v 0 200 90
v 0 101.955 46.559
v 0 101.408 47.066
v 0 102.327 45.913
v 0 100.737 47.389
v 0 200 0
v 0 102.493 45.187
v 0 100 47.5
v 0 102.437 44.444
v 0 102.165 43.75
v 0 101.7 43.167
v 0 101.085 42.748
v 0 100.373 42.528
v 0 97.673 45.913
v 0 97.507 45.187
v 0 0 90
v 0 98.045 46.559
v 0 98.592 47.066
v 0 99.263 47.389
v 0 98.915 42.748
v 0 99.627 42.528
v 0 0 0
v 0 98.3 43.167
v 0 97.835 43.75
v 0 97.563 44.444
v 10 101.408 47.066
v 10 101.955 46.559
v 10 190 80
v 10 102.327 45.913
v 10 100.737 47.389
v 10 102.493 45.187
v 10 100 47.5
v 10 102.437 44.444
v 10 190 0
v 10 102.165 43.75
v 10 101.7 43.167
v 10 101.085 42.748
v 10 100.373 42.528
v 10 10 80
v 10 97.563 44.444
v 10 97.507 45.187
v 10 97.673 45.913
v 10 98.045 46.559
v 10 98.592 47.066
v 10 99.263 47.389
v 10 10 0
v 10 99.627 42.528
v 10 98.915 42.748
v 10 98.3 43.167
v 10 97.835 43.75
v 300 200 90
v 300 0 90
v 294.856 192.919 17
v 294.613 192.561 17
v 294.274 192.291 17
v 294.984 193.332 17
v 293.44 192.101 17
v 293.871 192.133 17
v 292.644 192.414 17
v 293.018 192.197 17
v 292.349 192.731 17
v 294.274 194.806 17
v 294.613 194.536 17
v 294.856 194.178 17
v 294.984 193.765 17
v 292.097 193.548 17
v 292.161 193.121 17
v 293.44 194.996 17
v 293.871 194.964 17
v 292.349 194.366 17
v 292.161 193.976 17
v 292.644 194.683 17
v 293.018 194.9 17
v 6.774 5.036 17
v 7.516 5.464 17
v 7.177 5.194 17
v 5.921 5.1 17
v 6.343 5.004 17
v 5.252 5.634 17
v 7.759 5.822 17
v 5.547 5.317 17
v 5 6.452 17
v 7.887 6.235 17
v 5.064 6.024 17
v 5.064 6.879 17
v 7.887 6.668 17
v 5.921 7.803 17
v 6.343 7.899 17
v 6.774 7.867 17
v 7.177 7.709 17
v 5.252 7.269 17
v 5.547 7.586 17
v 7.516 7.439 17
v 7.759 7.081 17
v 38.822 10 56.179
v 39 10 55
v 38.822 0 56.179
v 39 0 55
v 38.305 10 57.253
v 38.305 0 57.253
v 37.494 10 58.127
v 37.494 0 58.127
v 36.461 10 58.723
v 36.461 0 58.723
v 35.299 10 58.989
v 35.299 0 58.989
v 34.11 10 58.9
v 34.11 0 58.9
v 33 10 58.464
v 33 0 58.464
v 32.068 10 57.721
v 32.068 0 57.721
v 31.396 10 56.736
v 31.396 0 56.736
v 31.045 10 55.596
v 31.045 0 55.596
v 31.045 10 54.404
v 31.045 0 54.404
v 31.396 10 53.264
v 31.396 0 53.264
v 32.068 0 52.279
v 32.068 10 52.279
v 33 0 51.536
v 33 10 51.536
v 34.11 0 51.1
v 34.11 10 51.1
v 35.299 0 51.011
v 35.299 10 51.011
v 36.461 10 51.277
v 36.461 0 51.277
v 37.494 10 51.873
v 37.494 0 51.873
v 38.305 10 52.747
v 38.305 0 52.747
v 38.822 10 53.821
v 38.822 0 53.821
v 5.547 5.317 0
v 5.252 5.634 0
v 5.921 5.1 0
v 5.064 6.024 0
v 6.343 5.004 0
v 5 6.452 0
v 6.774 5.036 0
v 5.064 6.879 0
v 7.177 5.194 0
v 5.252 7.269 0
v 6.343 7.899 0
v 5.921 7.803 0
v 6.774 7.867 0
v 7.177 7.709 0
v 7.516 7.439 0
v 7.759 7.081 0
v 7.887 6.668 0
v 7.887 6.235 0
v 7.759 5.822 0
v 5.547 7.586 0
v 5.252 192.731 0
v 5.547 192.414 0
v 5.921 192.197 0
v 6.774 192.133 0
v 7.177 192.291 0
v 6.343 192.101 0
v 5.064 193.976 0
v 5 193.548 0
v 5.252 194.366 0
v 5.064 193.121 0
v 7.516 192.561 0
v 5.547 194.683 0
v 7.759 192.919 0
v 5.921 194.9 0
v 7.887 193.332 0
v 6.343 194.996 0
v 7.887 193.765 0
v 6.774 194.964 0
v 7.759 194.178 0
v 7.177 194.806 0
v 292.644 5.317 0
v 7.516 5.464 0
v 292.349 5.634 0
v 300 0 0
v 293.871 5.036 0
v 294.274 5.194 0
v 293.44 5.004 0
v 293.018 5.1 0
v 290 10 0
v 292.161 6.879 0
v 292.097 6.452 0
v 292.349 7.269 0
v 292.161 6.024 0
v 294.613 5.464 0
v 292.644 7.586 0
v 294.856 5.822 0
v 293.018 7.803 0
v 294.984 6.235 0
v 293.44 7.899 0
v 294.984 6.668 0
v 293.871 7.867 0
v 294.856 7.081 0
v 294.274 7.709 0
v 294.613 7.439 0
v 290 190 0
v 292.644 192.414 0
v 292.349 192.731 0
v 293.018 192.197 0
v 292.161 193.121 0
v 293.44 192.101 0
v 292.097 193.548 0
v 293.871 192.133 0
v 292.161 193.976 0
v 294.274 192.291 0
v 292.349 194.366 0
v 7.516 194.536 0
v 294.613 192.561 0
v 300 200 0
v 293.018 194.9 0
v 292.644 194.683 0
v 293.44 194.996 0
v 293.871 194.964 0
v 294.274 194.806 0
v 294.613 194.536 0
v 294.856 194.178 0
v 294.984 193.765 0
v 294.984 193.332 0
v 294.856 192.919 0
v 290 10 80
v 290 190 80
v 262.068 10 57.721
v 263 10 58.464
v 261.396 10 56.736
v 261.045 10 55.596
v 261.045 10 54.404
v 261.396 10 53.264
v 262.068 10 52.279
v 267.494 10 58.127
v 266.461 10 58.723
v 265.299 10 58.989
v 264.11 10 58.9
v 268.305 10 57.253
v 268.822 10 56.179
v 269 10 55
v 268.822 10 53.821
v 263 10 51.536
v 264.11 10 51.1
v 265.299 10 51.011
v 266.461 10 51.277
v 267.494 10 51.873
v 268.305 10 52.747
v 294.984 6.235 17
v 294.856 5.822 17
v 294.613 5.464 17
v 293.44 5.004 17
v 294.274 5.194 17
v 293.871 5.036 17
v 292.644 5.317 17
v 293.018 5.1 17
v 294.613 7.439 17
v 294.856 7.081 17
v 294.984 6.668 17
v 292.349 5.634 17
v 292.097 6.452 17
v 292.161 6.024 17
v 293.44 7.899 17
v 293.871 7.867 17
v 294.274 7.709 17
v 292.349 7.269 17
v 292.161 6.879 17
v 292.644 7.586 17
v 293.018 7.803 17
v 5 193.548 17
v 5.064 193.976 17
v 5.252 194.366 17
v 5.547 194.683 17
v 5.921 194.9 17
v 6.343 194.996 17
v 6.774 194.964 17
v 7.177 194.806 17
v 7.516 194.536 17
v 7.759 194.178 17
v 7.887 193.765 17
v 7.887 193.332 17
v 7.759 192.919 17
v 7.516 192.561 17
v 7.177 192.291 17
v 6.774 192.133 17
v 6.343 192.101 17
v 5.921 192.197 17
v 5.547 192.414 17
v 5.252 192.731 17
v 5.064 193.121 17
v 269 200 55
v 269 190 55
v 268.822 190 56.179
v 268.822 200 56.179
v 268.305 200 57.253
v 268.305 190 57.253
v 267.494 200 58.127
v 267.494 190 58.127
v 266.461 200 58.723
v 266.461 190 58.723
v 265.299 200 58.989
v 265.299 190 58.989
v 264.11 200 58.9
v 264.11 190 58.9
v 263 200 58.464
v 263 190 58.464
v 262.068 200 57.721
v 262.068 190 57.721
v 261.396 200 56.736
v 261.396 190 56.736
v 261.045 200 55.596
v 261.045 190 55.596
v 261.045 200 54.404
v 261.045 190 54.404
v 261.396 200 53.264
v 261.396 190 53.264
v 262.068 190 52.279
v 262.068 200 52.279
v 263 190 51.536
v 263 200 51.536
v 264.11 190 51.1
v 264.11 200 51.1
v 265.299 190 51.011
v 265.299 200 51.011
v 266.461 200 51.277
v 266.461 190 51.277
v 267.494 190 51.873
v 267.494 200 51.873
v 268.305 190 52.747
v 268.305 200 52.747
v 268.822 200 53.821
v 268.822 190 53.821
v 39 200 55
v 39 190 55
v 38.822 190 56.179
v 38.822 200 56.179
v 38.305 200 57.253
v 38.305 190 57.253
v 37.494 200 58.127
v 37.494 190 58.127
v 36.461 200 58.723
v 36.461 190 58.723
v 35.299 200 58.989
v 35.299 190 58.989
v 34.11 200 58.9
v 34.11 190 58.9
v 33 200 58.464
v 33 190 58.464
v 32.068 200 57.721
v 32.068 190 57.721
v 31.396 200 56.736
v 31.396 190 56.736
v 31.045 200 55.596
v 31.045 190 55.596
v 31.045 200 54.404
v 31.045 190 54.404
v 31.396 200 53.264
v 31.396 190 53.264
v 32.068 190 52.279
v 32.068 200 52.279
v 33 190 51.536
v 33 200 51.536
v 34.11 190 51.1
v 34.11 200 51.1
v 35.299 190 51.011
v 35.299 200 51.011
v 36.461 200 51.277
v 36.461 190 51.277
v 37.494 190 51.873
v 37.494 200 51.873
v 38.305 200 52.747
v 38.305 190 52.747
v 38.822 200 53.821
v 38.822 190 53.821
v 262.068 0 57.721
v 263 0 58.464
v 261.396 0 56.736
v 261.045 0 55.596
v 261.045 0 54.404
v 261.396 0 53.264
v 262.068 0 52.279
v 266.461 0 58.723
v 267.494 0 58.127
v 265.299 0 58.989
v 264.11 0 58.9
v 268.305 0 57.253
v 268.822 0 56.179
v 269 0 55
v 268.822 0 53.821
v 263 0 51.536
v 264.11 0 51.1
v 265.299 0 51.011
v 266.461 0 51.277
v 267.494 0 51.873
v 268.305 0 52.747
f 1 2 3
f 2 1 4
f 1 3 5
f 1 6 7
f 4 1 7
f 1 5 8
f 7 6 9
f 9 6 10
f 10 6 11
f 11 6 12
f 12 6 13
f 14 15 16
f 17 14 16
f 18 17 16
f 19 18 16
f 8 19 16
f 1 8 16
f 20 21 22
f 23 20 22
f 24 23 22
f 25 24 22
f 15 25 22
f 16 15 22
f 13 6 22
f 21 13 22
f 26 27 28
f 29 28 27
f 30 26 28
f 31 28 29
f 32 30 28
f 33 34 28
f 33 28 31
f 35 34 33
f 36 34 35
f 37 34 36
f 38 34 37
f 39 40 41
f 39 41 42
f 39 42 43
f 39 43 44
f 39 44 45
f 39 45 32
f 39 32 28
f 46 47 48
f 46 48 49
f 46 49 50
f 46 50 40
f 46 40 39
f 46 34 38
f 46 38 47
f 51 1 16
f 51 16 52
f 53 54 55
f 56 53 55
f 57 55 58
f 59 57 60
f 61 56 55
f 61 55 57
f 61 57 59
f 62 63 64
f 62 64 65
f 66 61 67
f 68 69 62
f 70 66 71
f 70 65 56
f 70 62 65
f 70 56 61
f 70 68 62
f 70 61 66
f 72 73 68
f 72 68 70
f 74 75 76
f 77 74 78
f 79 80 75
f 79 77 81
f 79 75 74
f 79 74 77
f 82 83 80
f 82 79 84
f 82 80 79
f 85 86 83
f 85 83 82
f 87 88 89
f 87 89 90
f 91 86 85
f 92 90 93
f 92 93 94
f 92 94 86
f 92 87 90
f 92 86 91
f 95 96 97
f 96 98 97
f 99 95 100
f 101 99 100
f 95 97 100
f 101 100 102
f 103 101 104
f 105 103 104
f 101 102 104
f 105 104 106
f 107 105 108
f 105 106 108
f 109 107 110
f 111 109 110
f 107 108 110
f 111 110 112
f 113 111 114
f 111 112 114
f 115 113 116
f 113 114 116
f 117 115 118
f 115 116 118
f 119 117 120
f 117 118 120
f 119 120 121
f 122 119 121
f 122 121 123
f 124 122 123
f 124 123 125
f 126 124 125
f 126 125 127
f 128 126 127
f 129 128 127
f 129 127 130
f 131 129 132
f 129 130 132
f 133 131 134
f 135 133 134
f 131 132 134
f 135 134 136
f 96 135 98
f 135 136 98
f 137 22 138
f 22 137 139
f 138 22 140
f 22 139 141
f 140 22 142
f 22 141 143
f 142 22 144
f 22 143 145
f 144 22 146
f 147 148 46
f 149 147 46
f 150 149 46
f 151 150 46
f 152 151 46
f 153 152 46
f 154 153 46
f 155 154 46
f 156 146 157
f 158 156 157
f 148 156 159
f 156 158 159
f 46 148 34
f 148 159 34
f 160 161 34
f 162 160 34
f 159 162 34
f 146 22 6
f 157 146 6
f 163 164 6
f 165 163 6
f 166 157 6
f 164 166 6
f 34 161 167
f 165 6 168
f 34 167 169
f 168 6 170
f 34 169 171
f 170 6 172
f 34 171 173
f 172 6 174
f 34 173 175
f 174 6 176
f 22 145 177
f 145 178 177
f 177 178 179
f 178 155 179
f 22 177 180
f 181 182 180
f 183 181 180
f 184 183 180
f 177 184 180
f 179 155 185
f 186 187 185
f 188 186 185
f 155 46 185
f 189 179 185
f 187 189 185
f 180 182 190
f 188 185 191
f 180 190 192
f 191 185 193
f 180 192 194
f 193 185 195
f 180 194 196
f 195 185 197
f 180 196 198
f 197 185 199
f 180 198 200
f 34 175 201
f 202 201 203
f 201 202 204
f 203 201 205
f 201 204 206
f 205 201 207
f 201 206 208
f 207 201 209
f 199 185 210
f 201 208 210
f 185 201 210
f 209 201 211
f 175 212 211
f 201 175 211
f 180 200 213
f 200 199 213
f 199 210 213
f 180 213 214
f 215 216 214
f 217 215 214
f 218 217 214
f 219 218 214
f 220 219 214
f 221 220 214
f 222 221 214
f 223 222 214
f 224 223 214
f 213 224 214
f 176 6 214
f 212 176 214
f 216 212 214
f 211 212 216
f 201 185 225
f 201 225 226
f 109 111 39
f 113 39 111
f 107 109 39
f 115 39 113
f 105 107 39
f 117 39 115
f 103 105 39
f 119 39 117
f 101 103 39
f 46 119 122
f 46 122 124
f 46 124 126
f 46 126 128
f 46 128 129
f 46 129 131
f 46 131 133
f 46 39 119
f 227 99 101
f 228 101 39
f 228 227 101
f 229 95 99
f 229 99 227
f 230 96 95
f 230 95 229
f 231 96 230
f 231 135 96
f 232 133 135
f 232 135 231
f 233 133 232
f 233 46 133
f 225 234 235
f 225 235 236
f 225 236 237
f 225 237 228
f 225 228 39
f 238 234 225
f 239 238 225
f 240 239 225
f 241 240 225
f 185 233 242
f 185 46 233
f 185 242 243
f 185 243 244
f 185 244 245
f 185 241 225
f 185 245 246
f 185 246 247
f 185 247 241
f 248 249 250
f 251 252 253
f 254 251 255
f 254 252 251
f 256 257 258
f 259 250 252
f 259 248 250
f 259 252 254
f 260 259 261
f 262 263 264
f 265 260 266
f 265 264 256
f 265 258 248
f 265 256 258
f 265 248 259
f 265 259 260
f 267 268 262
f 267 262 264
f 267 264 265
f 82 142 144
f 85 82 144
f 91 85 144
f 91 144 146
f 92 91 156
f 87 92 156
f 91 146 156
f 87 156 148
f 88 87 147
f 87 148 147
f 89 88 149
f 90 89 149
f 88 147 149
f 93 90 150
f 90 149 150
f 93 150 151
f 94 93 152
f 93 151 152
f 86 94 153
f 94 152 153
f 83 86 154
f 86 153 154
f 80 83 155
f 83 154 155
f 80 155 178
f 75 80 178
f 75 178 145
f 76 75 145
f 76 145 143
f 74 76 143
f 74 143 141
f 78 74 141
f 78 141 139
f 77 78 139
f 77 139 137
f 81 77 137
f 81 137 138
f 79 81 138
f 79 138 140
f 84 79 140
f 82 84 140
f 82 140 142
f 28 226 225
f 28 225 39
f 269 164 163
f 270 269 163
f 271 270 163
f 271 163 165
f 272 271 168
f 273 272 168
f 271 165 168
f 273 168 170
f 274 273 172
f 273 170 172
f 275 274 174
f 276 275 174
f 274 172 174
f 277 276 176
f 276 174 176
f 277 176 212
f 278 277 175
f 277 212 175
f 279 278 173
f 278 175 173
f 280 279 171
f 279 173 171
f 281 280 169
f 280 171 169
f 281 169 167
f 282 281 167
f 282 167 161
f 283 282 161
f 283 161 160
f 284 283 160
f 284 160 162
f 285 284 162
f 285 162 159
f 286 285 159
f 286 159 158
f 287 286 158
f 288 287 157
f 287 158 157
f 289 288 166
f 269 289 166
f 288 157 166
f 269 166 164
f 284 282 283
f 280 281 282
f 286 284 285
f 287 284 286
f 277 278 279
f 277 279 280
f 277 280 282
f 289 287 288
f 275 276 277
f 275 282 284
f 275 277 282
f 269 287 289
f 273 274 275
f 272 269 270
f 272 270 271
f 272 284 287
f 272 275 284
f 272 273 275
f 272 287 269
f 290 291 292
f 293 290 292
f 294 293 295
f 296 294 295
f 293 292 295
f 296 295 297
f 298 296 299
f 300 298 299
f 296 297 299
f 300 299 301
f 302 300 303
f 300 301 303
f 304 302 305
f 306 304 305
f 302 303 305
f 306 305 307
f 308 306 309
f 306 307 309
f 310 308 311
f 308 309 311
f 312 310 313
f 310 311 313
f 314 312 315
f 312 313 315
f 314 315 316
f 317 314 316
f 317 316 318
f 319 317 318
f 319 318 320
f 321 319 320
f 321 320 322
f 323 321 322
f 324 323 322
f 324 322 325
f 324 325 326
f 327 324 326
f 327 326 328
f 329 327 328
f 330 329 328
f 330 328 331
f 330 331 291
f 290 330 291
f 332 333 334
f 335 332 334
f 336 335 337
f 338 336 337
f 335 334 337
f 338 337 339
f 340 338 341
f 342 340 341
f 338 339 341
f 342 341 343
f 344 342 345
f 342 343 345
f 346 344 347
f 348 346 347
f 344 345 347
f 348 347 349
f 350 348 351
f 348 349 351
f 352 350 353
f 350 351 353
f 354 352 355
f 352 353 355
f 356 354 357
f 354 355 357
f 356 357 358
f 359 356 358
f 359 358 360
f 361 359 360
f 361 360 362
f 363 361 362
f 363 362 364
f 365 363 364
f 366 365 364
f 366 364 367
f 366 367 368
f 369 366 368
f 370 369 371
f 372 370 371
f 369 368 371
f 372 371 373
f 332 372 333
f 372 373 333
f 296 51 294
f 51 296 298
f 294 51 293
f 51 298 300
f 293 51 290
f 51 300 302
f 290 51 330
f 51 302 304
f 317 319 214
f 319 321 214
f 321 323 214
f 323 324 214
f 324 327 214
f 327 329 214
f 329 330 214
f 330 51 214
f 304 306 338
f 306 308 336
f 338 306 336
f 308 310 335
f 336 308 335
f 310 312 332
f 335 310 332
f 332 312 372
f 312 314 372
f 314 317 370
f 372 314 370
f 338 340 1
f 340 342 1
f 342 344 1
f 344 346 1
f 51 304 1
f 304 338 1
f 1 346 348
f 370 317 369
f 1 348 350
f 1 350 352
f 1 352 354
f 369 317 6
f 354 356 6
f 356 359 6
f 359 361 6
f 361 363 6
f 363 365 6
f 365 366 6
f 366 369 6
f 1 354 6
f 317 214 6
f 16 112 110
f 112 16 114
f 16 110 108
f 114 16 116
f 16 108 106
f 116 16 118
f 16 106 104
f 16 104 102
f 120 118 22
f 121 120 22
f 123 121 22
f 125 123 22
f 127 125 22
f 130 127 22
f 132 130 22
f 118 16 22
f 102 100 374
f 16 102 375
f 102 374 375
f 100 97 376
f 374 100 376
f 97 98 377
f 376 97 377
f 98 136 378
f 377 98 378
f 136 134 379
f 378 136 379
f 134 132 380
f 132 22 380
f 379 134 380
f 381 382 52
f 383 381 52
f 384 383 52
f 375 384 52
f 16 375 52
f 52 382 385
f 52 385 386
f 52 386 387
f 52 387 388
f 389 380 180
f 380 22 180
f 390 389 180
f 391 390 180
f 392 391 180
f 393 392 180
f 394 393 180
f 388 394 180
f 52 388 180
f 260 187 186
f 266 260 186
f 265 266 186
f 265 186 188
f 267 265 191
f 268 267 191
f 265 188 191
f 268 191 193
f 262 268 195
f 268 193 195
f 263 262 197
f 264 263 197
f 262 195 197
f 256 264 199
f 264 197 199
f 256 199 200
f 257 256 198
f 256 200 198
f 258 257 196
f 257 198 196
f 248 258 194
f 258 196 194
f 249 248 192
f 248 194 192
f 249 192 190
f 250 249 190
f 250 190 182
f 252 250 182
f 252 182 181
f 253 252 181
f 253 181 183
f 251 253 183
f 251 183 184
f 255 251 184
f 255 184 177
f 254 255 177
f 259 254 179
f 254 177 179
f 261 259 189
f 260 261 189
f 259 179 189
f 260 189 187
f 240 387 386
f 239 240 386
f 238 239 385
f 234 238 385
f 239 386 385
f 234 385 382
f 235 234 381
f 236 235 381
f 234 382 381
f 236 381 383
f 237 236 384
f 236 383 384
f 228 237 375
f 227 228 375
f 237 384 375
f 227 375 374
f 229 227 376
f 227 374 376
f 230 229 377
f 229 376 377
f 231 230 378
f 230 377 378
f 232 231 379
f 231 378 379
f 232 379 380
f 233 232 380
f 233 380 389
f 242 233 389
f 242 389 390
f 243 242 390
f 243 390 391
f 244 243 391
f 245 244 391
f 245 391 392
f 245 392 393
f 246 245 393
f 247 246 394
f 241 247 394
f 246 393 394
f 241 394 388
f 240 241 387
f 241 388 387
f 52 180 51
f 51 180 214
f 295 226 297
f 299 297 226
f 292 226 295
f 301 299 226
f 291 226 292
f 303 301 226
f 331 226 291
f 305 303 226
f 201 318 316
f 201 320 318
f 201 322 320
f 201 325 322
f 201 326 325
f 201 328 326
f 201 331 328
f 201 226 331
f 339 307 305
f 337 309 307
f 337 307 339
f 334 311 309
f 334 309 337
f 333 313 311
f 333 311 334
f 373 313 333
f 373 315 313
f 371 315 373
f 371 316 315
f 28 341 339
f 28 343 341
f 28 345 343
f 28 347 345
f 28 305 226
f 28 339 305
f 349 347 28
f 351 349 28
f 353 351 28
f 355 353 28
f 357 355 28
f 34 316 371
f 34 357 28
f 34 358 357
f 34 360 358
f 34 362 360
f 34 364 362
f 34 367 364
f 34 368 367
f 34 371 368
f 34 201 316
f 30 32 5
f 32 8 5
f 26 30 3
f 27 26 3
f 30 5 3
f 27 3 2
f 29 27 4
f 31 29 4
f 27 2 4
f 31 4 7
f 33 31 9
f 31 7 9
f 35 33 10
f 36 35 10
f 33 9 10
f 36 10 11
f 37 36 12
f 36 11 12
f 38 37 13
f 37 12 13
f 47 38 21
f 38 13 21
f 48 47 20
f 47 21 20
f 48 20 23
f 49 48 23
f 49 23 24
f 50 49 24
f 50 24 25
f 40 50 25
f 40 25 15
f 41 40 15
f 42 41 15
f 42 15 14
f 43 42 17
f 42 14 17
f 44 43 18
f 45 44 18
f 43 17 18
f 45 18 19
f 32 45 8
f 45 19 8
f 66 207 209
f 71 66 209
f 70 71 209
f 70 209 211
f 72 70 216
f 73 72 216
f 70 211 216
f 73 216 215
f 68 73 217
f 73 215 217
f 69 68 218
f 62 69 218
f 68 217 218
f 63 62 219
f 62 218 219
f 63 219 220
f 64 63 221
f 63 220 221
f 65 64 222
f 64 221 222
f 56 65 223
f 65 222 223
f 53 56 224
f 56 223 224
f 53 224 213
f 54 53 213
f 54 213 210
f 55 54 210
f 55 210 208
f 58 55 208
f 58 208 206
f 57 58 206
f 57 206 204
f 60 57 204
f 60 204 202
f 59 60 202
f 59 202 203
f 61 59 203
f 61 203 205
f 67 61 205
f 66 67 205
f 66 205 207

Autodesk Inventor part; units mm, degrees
ref_plane "YZ Plane" through (0, 0, 0) normal (1, 0, 0) x (0, 1, 0)
ref_plane "XZ Plane" through (0, 0, 0) normal (0, 1, 0) x (-1, 0, 0)
ref_plane "XY Plane" through (0, 0, 0) normal (0, 0, 1) x (1, 0, 0)
sketch "Sketch1" plane through (0, 0, 0) normal (0, 0, 1) x (1, 0, 0)
  line L0 (0, 0) -> (300, 0)
  line L1 (300, 0) -> (300, 200)
  line L2 (300, 200) -> (0, 200)
  line L3 (0, 200) -> (0, 0)
  dimension "d0" = 200
  dimension "d1" = 300
extrude "Extrusion1" add sketch "Sketch1" along normal blind 90
sketch "Sketch2" plane through (0, 0, 0) normal (0, 0, -1) x (-1, 0, 0)
  line L0 (-10, 10) -> (-290, 10)
  line L1 (-290, 10) -> (-290, 190)
  line L2 (-290, 190) -> (-10, 190)
  line L3 (-10, 190) -> (-10, 10)
  line L4 (0, 0) -> (-300, 0) projected
  line L5 (0, 200) -> (0, 0) projected
  dimension "d4" = 180
  dimension "d5" = 280
  dimension "d6" = 10
  dimension "d7" = 10
extrude "Extrusion2" cut sketch "Sketch2" against normal blind 80
sketch "Sketch4" plane through (0, 0, 0) normal (0, 0, -1) x (-1, 0, 0)
  circle A0 centre (-6.4515, 6.4515) radius 1.4515
  circle A1 centre (-6.4515, 193.5485) radius 1.4515
  circle A2 centre (-293.5485, 193.5485) radius 1.4515
  circle A3 centre (-293.5485, 6.4515) radius 1.4515
  line L0 (0, 0) -> (-300, 0) projected
  line L1 (0, 200) -> (0, 0) projected
  line L2 (-300, 200) -> (0, 200) projected
  line L3 (-300, 0) -> (-300, 200) projected
  dimension "d18" = 2.903
  dimension "d19" = 2.903
  dimension "d20" = 2.903
  dimension "d21" = 2.903
  dimension "d22" = 5
  dimension "d23" = 5
  dimension "d24" = 5
  dimension "d25" = 5
  dimension "d26" = 5
  dimension "d27" = 5
  dimension "d28" = 5
  dimension "d29" = 5
extrude "Extrusion4" cut sketch "Sketch4" against normal blind 17 contours A0 | A1 | A2 | A3
sketch "Sketch5" plane through (0, 0, 0) normal (0, -1, 0) x (1, 0, 0)
  circle A0 centre (265, 55) radius 4
  circle A1 centre (35, 55) radius 4
  line L0 (0, 90) -> (300, 90) projected
  line L1 (300, 0) -> (300, 90) projected
  line L2 (0, 0) -> (0, 90) projected
  dimension "d32" = 8
  dimension "d33" = 8
  dimension "d34" = 35
  dimension "d35" = 35
  dimension "d36" = 35
  dimension "d37" = 35
extrude "Extrusion5" cut sketch "Sketch5" against normal through all
sketch "Sketch6" plane through (0, 0, 80) normal (0, 0, -1) x (-1, 0, 0)
  point P0 (0, 0)
sketch "Sketch7" plane through (0, 0, 80) normal (0, 0, -1) x (-1, 0, 0)
  line L0 (-10, 190) -> (-10, 10) projected
  point P0 (0, 0)
sketch "Sketch8" plane through (0, 0, 0) normal (-1, 0, 0) x (0, 0, 1)
  circle A0 centre (45, 100) radius 2.5
  line L0 (0, 0) -> (90, 0) projected
  line L1 (0, 200) -> (0, 0) projected
  dimension "d57" = 5
  dimension "d58" = 100
  dimension "d59" = 45
extrude "Extrusion6" cut sketch "Sketch8" against normal blind 10
equation "\"BendRadius\" = Thickness"
equation "\"BendReliefWidth\" = Thickness"
equation "\"BendReliefDepth\" = 0.5 * Thickness"
equation "\"CornerReliefSize\" = 4 * Thickness"
equation "\"MinimumRemnant\" = 2 * Thickness"
equation "\"TransitionRadius\" = BendRadius"
equation "\"JacobiRadiusSize\" = BendRadius"
equation "\"GapSize\" = Thickness"
equation "\"Thickness\" = 0.5"
properties part number "base"
